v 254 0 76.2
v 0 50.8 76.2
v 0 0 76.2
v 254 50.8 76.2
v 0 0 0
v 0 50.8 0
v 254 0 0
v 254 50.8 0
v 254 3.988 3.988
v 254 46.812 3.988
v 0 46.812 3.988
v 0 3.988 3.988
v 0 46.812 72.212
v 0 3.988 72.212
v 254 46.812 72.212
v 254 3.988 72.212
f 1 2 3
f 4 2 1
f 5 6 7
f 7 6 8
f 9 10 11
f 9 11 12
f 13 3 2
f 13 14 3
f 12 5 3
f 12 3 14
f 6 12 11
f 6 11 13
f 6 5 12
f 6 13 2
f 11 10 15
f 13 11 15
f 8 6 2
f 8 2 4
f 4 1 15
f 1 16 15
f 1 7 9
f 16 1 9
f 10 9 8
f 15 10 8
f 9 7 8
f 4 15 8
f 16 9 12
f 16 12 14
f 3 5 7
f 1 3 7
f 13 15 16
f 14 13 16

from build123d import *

# Parameters (mm, degrees)
F0_W     = 254
F0_H     = 50.8
F1_DEPTH = 76.2
F2_T     = -3.9878
F3_DEPTH = 3.9888


with BuildPart() as f1:
    # F0 (on Top) → F1 (new body)
    with BuildSketch(Plane.XY):
        with Locations((127, 25.4)):
            Rectangle(F0_W, F0_H)
    extrude(amount=F1_DEPTH)

    # F2
    f2_openings = [f1.faces().sort_by_distance(p)[0] for p in [
        (254, 25.4, 38.1),
    ]]
    offset(amount=F2_T, openings=f2_openings)

    # F3 (cut, through all): a face of the model
    f3_faces = [f1.faces().sort_by_distance(p)[0] for p in [
        (3.9878, 25.4, 38.1),
    ]]
    extrude(f3_faces, amount=-F3_DEPTH, mode=Mode.SUBTRACT)


solid = f1.part
